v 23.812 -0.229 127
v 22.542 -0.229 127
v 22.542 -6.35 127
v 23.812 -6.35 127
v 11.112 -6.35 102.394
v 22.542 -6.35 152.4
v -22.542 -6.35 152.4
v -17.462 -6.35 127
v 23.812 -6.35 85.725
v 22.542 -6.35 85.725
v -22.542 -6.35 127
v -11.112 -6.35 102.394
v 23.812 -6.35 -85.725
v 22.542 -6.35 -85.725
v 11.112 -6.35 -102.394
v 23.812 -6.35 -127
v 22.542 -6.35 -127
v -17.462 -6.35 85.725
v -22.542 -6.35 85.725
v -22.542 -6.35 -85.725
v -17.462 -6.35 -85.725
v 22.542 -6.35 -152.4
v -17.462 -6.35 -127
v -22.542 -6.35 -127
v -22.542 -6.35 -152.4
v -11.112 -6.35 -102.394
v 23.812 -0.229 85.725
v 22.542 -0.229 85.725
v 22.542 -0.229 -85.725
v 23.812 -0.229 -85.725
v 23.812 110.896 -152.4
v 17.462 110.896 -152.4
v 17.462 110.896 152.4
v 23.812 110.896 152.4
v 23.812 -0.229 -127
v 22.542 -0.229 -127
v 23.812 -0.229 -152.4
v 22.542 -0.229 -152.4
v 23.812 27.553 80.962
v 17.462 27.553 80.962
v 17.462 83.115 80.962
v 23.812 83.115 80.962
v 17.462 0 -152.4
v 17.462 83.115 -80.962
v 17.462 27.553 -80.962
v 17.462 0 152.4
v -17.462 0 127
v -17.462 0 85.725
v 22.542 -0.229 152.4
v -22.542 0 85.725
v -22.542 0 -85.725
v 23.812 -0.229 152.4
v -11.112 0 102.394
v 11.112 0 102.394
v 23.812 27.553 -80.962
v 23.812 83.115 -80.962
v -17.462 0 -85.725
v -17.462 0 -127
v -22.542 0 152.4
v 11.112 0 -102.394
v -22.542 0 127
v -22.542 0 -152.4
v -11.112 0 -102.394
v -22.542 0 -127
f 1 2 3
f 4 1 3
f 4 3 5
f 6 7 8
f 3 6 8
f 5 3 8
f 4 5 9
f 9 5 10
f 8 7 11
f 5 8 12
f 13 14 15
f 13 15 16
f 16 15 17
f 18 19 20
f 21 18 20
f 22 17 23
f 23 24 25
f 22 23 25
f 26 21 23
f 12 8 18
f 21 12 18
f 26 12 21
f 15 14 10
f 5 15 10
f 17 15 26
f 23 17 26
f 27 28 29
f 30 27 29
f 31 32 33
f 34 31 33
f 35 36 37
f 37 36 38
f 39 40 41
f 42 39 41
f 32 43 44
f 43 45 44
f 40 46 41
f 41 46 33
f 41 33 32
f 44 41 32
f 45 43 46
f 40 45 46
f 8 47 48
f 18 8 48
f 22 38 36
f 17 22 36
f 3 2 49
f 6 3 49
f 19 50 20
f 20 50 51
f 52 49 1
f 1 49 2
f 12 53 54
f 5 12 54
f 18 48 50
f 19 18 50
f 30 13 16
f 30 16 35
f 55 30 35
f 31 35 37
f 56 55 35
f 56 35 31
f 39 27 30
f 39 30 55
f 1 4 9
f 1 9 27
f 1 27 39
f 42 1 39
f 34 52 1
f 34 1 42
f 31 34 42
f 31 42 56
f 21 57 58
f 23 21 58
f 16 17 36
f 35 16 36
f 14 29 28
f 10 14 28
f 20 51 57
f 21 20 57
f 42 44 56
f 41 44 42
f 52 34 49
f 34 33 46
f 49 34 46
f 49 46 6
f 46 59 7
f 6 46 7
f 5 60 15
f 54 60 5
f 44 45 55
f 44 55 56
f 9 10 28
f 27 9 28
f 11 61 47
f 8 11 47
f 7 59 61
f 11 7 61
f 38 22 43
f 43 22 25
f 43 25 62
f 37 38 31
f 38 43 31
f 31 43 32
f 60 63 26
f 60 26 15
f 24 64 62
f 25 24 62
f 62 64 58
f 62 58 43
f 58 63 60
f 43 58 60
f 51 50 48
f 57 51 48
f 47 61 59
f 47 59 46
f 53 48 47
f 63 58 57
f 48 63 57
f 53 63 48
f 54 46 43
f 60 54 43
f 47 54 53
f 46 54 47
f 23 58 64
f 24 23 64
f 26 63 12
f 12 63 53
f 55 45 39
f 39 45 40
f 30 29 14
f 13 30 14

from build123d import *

# Parameters (mm, degrees)
F0_W     = 22.225
F0_H     = 204.7875
F1_DEPTH = 6.35
F3_W     = 55.5625
F3_H     = 161.925
F4_DEPTH = 6.35


with BuildPart() as f1:
    # F0 (on Front) → F1 (new body)
    with BuildSketch(Plane.XZ):
        Polygon((17.4625, 152.4), (-17.4625, 152.4), (-22.5425, 152.4), (-22.5425, 127), (-17.4625, 127), (-17.4625, 85.725), (-22.5425, 85.725), (-22.5425, 0), (-22.5425, -85.725), (-17.4625, -85.725), (-17.4625, -127), (-22.5425, -127), (-22.5425, -152.4), (-17.4625, -152.4), (17.4625, -152.4), (22.5425, -152.4), (22.5425, -127), (17.4625, -127), (17.4625, -85.725), (22.5425, -85.725), (22.5425, 0), (22.5425, 85.725), (17.4625, 85.725), (17.4625, 127), (22.5425, 127), (22.5425, 152.4), align=None)
        Rectangle(F0_W, F0_H, mode=Mode.SUBTRACT)
    extrude(amount=F1_DEPTH)

    # F3 (on offset) → F4 (join)
    with BuildSketch(Plane.YZ.offset(17.4625)):
        Polygon((110.8964, -152.4), (110.8964, 152.4), (-0.2286, 152.4), (-0.2286, 127), (-6.35, 127), (-6.35, 85.725), (-0.2286, 85.725), (-0.2286, -85.725), (-6.35, -85.725), (-6.35, -127), (-0.2286, -127), (-0.2286, -152.4), align=None)
        with Locations((55.3339, 0)):
            Rectangle(F3_W, F3_H, mode=Mode.SUBTRACT)
    extrude(amount=F4_DEPTH)


solid = f1.part
